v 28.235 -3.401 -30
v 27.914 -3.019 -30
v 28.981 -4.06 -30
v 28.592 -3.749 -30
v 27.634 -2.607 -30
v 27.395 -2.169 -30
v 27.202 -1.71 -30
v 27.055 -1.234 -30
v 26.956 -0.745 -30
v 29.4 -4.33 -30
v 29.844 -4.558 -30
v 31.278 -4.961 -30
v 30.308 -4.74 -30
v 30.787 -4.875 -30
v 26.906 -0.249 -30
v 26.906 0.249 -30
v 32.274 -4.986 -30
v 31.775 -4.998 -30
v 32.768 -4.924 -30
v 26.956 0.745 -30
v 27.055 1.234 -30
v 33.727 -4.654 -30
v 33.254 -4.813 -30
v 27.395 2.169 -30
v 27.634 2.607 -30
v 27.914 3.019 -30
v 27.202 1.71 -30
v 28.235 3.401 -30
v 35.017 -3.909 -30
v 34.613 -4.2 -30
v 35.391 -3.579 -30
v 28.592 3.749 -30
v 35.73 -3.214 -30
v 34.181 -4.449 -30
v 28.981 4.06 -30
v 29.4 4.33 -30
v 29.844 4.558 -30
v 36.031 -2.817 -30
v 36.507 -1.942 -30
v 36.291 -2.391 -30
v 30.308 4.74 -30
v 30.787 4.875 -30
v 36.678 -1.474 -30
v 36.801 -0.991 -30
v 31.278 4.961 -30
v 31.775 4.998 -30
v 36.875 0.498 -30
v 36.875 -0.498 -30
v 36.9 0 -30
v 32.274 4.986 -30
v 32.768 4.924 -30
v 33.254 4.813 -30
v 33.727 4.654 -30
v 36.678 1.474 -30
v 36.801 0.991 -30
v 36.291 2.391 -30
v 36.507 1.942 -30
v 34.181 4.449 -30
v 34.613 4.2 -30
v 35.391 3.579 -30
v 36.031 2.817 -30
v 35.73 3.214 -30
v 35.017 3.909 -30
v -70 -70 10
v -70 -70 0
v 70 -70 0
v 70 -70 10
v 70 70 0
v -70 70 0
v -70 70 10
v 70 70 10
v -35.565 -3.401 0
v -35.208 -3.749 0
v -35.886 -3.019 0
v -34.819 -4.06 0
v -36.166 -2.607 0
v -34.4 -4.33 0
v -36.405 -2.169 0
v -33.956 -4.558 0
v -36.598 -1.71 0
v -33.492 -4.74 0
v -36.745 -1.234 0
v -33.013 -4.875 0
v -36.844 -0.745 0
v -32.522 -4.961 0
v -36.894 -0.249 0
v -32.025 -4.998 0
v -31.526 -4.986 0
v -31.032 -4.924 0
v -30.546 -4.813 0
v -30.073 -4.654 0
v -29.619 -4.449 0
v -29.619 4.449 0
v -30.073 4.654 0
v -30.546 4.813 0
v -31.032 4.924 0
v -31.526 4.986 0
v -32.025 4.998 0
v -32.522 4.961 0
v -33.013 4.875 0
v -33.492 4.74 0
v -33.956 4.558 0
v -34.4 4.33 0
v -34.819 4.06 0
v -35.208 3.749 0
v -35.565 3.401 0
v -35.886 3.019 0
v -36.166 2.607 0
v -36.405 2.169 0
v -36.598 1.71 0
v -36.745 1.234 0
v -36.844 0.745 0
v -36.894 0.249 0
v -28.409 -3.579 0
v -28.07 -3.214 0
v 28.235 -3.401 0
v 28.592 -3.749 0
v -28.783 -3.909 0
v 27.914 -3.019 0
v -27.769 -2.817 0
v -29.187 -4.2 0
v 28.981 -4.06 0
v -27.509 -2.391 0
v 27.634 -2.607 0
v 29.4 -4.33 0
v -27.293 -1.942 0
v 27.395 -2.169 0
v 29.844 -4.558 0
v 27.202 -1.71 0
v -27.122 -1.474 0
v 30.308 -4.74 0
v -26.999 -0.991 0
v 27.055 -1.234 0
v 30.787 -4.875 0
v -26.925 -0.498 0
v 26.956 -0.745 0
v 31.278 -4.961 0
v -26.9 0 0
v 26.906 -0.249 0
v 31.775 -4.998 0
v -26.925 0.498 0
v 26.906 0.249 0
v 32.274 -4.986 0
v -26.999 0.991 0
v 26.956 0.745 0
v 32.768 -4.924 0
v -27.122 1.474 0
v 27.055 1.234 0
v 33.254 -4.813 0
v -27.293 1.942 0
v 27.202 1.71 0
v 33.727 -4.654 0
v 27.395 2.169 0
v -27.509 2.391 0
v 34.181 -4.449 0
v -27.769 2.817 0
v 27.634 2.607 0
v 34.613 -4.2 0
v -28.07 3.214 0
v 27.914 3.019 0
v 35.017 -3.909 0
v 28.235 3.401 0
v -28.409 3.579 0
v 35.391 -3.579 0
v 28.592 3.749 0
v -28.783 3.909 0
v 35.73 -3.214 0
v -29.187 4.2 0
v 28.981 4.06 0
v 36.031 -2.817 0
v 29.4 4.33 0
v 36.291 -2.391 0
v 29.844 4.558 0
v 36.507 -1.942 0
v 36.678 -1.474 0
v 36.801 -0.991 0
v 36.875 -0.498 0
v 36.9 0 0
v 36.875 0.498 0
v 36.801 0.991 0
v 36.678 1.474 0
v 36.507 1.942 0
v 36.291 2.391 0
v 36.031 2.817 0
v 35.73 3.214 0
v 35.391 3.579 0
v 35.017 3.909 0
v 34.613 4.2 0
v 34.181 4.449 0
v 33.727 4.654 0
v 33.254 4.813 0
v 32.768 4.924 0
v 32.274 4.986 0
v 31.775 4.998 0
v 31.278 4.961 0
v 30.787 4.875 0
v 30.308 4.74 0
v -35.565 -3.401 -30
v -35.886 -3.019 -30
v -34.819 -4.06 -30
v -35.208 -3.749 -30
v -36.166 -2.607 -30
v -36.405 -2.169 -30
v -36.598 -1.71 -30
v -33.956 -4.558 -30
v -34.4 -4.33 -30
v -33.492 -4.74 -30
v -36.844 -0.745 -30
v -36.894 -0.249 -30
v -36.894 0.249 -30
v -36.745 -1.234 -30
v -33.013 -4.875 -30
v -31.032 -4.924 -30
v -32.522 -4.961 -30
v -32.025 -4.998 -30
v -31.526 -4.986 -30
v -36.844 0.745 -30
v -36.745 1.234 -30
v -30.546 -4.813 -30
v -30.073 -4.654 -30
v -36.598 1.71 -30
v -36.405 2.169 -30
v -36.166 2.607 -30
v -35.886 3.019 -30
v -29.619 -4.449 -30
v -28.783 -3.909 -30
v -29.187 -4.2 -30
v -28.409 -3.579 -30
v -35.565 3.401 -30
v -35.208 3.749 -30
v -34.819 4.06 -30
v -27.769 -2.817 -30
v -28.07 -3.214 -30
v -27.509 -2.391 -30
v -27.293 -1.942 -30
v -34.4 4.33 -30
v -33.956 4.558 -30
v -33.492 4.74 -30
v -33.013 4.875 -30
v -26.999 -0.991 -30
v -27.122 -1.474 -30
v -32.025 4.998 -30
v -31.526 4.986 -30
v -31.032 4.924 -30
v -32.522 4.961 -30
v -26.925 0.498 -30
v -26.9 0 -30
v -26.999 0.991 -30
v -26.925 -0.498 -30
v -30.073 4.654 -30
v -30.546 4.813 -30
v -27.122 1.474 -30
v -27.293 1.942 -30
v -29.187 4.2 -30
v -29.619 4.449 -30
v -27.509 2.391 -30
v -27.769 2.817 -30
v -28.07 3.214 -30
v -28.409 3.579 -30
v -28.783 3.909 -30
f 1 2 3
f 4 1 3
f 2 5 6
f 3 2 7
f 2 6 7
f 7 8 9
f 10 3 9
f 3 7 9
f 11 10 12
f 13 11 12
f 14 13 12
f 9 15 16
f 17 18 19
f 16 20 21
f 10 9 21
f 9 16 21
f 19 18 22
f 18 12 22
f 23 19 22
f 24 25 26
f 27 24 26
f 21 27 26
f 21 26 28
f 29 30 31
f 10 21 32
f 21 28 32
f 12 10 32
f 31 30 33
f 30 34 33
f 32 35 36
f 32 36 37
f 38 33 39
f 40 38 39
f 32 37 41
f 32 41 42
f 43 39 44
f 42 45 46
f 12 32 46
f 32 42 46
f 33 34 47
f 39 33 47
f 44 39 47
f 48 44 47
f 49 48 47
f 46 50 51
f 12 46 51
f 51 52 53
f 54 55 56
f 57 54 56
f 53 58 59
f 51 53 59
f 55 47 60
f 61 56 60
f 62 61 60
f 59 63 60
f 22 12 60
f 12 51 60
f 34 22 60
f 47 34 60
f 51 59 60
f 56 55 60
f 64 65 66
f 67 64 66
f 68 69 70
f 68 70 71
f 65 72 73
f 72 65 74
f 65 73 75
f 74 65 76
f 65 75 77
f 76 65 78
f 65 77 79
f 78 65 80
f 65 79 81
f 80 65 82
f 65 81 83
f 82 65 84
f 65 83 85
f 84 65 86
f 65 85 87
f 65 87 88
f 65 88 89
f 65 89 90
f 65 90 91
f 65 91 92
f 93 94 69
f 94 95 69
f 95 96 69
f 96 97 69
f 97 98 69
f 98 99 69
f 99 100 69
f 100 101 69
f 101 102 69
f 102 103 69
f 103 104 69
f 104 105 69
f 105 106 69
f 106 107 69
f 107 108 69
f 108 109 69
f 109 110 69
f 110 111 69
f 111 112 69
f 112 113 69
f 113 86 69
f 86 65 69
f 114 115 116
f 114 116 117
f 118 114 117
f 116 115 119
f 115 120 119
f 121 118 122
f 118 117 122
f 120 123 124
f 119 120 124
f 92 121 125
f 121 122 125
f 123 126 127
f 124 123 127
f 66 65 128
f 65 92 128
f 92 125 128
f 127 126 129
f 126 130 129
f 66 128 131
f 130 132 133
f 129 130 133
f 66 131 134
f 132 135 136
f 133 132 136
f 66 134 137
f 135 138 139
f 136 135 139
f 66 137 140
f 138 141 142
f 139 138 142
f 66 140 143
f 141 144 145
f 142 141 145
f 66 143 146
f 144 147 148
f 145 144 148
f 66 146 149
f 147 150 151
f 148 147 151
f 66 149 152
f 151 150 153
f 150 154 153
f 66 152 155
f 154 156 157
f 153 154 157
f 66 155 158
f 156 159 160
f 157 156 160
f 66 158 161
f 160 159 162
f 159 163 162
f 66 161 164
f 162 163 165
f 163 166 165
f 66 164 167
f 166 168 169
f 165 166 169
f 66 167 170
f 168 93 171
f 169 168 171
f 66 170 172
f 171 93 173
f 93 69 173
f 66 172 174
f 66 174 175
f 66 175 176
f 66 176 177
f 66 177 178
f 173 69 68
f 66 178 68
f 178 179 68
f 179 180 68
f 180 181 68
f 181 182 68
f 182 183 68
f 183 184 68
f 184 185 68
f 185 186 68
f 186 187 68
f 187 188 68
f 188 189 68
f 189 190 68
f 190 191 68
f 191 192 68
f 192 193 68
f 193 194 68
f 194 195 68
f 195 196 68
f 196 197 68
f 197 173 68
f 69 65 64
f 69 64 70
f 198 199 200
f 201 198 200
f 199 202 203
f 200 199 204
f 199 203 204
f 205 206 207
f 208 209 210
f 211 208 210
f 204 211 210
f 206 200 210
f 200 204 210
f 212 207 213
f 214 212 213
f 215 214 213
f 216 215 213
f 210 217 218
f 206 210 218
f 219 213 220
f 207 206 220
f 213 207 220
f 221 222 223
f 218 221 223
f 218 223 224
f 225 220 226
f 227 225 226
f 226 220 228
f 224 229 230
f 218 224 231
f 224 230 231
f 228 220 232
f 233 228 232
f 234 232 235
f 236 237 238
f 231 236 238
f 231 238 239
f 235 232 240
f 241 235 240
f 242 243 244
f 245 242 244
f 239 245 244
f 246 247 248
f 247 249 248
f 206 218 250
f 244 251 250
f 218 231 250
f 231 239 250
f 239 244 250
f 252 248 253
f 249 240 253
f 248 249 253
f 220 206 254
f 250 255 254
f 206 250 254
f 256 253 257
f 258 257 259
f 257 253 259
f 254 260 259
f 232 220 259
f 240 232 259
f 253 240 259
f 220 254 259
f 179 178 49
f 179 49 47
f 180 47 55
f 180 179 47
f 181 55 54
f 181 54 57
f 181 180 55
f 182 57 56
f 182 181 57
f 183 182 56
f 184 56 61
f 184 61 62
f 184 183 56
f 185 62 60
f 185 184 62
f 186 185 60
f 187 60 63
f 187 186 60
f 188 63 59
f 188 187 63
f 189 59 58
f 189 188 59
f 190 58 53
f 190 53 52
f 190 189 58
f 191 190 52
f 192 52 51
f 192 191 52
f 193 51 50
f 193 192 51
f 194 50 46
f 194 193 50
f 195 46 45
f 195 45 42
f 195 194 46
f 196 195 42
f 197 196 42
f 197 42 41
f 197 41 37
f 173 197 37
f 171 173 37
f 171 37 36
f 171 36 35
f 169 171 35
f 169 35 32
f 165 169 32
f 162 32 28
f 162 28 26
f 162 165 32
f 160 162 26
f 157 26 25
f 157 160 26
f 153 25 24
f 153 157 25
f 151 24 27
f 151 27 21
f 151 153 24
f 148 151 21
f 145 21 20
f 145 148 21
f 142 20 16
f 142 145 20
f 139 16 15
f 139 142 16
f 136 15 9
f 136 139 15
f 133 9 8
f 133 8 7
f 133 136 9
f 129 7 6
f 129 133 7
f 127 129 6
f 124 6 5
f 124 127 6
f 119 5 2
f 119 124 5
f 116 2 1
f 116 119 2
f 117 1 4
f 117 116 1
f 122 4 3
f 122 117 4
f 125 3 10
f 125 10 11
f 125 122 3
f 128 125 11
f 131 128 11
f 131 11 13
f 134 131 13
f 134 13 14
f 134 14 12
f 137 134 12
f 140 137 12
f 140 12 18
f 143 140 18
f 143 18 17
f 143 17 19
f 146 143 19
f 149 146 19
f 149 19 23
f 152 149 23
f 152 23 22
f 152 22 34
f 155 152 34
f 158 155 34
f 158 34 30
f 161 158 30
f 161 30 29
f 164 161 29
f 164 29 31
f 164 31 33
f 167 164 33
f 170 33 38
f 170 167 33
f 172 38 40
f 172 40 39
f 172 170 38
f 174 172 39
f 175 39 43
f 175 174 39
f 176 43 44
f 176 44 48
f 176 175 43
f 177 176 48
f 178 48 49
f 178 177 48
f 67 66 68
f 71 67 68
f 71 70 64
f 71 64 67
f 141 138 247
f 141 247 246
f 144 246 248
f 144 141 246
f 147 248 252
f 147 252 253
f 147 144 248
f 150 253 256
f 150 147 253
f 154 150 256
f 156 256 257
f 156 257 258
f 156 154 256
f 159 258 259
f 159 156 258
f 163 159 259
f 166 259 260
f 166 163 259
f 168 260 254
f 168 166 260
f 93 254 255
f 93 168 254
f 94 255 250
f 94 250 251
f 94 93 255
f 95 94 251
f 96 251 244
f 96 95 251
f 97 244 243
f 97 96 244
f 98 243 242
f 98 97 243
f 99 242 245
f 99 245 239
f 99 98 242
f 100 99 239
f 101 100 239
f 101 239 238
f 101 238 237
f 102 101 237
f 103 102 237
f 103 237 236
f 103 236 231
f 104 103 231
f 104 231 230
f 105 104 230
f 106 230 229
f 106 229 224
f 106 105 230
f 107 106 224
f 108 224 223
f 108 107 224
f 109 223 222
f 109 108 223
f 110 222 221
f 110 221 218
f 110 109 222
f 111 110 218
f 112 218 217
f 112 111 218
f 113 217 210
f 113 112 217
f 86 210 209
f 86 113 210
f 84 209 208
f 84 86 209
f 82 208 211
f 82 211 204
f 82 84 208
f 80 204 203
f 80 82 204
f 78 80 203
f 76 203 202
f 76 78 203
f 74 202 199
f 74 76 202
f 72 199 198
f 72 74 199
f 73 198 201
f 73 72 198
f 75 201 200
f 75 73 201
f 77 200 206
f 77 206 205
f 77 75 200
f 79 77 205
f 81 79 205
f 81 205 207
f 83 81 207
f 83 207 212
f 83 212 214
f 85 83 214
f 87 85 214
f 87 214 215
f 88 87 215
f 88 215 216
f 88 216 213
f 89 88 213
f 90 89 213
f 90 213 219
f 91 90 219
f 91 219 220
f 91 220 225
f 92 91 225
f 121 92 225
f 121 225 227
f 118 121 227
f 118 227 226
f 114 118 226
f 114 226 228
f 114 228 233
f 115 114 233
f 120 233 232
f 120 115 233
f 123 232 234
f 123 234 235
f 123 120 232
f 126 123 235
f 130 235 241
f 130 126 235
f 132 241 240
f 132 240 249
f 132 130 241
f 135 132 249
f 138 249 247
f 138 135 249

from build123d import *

# Parameters (mm, degrees)
SKETCH1_W           = 140
SKETCH1_H           = 140
BOSS_EXTRUDE1_DEPTH = 10
SKETCH2_R           = 5
BOSS_EXTRUDE2_DEPTH = 30


with BuildPart() as part:
    # Sketch1 → Boss-Extrude1 (new body)
    with BuildSketch(Plane.XY):
        Rectangle(SKETCH1_W, SKETCH1_H)
    extrude(amount=BOSS_EXTRUDE1_DEPTH)

    # Sketch2 → Boss-Extrude2 (add)
    with BuildSketch(Plane.XY):
        with Locations((-31.9, 0)):
            Circle(SKETCH2_R)
        with Locations((31.9, 0)):
            Circle(SKETCH2_R)
    extrude(amount=-BOSS_EXTRUDE2_DEPTH)


solid = part.part
